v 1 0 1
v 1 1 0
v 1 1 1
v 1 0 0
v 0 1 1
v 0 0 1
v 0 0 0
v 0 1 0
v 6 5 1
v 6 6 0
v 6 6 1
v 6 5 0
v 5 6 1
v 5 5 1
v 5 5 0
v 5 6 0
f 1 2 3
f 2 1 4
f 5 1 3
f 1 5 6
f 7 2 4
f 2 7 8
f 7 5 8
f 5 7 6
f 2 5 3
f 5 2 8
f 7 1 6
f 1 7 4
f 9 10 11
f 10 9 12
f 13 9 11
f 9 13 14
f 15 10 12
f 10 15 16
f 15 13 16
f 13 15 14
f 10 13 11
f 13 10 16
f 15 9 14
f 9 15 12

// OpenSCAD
// should create a two-volume amf file
cube();
translate([5,5]) cube();
